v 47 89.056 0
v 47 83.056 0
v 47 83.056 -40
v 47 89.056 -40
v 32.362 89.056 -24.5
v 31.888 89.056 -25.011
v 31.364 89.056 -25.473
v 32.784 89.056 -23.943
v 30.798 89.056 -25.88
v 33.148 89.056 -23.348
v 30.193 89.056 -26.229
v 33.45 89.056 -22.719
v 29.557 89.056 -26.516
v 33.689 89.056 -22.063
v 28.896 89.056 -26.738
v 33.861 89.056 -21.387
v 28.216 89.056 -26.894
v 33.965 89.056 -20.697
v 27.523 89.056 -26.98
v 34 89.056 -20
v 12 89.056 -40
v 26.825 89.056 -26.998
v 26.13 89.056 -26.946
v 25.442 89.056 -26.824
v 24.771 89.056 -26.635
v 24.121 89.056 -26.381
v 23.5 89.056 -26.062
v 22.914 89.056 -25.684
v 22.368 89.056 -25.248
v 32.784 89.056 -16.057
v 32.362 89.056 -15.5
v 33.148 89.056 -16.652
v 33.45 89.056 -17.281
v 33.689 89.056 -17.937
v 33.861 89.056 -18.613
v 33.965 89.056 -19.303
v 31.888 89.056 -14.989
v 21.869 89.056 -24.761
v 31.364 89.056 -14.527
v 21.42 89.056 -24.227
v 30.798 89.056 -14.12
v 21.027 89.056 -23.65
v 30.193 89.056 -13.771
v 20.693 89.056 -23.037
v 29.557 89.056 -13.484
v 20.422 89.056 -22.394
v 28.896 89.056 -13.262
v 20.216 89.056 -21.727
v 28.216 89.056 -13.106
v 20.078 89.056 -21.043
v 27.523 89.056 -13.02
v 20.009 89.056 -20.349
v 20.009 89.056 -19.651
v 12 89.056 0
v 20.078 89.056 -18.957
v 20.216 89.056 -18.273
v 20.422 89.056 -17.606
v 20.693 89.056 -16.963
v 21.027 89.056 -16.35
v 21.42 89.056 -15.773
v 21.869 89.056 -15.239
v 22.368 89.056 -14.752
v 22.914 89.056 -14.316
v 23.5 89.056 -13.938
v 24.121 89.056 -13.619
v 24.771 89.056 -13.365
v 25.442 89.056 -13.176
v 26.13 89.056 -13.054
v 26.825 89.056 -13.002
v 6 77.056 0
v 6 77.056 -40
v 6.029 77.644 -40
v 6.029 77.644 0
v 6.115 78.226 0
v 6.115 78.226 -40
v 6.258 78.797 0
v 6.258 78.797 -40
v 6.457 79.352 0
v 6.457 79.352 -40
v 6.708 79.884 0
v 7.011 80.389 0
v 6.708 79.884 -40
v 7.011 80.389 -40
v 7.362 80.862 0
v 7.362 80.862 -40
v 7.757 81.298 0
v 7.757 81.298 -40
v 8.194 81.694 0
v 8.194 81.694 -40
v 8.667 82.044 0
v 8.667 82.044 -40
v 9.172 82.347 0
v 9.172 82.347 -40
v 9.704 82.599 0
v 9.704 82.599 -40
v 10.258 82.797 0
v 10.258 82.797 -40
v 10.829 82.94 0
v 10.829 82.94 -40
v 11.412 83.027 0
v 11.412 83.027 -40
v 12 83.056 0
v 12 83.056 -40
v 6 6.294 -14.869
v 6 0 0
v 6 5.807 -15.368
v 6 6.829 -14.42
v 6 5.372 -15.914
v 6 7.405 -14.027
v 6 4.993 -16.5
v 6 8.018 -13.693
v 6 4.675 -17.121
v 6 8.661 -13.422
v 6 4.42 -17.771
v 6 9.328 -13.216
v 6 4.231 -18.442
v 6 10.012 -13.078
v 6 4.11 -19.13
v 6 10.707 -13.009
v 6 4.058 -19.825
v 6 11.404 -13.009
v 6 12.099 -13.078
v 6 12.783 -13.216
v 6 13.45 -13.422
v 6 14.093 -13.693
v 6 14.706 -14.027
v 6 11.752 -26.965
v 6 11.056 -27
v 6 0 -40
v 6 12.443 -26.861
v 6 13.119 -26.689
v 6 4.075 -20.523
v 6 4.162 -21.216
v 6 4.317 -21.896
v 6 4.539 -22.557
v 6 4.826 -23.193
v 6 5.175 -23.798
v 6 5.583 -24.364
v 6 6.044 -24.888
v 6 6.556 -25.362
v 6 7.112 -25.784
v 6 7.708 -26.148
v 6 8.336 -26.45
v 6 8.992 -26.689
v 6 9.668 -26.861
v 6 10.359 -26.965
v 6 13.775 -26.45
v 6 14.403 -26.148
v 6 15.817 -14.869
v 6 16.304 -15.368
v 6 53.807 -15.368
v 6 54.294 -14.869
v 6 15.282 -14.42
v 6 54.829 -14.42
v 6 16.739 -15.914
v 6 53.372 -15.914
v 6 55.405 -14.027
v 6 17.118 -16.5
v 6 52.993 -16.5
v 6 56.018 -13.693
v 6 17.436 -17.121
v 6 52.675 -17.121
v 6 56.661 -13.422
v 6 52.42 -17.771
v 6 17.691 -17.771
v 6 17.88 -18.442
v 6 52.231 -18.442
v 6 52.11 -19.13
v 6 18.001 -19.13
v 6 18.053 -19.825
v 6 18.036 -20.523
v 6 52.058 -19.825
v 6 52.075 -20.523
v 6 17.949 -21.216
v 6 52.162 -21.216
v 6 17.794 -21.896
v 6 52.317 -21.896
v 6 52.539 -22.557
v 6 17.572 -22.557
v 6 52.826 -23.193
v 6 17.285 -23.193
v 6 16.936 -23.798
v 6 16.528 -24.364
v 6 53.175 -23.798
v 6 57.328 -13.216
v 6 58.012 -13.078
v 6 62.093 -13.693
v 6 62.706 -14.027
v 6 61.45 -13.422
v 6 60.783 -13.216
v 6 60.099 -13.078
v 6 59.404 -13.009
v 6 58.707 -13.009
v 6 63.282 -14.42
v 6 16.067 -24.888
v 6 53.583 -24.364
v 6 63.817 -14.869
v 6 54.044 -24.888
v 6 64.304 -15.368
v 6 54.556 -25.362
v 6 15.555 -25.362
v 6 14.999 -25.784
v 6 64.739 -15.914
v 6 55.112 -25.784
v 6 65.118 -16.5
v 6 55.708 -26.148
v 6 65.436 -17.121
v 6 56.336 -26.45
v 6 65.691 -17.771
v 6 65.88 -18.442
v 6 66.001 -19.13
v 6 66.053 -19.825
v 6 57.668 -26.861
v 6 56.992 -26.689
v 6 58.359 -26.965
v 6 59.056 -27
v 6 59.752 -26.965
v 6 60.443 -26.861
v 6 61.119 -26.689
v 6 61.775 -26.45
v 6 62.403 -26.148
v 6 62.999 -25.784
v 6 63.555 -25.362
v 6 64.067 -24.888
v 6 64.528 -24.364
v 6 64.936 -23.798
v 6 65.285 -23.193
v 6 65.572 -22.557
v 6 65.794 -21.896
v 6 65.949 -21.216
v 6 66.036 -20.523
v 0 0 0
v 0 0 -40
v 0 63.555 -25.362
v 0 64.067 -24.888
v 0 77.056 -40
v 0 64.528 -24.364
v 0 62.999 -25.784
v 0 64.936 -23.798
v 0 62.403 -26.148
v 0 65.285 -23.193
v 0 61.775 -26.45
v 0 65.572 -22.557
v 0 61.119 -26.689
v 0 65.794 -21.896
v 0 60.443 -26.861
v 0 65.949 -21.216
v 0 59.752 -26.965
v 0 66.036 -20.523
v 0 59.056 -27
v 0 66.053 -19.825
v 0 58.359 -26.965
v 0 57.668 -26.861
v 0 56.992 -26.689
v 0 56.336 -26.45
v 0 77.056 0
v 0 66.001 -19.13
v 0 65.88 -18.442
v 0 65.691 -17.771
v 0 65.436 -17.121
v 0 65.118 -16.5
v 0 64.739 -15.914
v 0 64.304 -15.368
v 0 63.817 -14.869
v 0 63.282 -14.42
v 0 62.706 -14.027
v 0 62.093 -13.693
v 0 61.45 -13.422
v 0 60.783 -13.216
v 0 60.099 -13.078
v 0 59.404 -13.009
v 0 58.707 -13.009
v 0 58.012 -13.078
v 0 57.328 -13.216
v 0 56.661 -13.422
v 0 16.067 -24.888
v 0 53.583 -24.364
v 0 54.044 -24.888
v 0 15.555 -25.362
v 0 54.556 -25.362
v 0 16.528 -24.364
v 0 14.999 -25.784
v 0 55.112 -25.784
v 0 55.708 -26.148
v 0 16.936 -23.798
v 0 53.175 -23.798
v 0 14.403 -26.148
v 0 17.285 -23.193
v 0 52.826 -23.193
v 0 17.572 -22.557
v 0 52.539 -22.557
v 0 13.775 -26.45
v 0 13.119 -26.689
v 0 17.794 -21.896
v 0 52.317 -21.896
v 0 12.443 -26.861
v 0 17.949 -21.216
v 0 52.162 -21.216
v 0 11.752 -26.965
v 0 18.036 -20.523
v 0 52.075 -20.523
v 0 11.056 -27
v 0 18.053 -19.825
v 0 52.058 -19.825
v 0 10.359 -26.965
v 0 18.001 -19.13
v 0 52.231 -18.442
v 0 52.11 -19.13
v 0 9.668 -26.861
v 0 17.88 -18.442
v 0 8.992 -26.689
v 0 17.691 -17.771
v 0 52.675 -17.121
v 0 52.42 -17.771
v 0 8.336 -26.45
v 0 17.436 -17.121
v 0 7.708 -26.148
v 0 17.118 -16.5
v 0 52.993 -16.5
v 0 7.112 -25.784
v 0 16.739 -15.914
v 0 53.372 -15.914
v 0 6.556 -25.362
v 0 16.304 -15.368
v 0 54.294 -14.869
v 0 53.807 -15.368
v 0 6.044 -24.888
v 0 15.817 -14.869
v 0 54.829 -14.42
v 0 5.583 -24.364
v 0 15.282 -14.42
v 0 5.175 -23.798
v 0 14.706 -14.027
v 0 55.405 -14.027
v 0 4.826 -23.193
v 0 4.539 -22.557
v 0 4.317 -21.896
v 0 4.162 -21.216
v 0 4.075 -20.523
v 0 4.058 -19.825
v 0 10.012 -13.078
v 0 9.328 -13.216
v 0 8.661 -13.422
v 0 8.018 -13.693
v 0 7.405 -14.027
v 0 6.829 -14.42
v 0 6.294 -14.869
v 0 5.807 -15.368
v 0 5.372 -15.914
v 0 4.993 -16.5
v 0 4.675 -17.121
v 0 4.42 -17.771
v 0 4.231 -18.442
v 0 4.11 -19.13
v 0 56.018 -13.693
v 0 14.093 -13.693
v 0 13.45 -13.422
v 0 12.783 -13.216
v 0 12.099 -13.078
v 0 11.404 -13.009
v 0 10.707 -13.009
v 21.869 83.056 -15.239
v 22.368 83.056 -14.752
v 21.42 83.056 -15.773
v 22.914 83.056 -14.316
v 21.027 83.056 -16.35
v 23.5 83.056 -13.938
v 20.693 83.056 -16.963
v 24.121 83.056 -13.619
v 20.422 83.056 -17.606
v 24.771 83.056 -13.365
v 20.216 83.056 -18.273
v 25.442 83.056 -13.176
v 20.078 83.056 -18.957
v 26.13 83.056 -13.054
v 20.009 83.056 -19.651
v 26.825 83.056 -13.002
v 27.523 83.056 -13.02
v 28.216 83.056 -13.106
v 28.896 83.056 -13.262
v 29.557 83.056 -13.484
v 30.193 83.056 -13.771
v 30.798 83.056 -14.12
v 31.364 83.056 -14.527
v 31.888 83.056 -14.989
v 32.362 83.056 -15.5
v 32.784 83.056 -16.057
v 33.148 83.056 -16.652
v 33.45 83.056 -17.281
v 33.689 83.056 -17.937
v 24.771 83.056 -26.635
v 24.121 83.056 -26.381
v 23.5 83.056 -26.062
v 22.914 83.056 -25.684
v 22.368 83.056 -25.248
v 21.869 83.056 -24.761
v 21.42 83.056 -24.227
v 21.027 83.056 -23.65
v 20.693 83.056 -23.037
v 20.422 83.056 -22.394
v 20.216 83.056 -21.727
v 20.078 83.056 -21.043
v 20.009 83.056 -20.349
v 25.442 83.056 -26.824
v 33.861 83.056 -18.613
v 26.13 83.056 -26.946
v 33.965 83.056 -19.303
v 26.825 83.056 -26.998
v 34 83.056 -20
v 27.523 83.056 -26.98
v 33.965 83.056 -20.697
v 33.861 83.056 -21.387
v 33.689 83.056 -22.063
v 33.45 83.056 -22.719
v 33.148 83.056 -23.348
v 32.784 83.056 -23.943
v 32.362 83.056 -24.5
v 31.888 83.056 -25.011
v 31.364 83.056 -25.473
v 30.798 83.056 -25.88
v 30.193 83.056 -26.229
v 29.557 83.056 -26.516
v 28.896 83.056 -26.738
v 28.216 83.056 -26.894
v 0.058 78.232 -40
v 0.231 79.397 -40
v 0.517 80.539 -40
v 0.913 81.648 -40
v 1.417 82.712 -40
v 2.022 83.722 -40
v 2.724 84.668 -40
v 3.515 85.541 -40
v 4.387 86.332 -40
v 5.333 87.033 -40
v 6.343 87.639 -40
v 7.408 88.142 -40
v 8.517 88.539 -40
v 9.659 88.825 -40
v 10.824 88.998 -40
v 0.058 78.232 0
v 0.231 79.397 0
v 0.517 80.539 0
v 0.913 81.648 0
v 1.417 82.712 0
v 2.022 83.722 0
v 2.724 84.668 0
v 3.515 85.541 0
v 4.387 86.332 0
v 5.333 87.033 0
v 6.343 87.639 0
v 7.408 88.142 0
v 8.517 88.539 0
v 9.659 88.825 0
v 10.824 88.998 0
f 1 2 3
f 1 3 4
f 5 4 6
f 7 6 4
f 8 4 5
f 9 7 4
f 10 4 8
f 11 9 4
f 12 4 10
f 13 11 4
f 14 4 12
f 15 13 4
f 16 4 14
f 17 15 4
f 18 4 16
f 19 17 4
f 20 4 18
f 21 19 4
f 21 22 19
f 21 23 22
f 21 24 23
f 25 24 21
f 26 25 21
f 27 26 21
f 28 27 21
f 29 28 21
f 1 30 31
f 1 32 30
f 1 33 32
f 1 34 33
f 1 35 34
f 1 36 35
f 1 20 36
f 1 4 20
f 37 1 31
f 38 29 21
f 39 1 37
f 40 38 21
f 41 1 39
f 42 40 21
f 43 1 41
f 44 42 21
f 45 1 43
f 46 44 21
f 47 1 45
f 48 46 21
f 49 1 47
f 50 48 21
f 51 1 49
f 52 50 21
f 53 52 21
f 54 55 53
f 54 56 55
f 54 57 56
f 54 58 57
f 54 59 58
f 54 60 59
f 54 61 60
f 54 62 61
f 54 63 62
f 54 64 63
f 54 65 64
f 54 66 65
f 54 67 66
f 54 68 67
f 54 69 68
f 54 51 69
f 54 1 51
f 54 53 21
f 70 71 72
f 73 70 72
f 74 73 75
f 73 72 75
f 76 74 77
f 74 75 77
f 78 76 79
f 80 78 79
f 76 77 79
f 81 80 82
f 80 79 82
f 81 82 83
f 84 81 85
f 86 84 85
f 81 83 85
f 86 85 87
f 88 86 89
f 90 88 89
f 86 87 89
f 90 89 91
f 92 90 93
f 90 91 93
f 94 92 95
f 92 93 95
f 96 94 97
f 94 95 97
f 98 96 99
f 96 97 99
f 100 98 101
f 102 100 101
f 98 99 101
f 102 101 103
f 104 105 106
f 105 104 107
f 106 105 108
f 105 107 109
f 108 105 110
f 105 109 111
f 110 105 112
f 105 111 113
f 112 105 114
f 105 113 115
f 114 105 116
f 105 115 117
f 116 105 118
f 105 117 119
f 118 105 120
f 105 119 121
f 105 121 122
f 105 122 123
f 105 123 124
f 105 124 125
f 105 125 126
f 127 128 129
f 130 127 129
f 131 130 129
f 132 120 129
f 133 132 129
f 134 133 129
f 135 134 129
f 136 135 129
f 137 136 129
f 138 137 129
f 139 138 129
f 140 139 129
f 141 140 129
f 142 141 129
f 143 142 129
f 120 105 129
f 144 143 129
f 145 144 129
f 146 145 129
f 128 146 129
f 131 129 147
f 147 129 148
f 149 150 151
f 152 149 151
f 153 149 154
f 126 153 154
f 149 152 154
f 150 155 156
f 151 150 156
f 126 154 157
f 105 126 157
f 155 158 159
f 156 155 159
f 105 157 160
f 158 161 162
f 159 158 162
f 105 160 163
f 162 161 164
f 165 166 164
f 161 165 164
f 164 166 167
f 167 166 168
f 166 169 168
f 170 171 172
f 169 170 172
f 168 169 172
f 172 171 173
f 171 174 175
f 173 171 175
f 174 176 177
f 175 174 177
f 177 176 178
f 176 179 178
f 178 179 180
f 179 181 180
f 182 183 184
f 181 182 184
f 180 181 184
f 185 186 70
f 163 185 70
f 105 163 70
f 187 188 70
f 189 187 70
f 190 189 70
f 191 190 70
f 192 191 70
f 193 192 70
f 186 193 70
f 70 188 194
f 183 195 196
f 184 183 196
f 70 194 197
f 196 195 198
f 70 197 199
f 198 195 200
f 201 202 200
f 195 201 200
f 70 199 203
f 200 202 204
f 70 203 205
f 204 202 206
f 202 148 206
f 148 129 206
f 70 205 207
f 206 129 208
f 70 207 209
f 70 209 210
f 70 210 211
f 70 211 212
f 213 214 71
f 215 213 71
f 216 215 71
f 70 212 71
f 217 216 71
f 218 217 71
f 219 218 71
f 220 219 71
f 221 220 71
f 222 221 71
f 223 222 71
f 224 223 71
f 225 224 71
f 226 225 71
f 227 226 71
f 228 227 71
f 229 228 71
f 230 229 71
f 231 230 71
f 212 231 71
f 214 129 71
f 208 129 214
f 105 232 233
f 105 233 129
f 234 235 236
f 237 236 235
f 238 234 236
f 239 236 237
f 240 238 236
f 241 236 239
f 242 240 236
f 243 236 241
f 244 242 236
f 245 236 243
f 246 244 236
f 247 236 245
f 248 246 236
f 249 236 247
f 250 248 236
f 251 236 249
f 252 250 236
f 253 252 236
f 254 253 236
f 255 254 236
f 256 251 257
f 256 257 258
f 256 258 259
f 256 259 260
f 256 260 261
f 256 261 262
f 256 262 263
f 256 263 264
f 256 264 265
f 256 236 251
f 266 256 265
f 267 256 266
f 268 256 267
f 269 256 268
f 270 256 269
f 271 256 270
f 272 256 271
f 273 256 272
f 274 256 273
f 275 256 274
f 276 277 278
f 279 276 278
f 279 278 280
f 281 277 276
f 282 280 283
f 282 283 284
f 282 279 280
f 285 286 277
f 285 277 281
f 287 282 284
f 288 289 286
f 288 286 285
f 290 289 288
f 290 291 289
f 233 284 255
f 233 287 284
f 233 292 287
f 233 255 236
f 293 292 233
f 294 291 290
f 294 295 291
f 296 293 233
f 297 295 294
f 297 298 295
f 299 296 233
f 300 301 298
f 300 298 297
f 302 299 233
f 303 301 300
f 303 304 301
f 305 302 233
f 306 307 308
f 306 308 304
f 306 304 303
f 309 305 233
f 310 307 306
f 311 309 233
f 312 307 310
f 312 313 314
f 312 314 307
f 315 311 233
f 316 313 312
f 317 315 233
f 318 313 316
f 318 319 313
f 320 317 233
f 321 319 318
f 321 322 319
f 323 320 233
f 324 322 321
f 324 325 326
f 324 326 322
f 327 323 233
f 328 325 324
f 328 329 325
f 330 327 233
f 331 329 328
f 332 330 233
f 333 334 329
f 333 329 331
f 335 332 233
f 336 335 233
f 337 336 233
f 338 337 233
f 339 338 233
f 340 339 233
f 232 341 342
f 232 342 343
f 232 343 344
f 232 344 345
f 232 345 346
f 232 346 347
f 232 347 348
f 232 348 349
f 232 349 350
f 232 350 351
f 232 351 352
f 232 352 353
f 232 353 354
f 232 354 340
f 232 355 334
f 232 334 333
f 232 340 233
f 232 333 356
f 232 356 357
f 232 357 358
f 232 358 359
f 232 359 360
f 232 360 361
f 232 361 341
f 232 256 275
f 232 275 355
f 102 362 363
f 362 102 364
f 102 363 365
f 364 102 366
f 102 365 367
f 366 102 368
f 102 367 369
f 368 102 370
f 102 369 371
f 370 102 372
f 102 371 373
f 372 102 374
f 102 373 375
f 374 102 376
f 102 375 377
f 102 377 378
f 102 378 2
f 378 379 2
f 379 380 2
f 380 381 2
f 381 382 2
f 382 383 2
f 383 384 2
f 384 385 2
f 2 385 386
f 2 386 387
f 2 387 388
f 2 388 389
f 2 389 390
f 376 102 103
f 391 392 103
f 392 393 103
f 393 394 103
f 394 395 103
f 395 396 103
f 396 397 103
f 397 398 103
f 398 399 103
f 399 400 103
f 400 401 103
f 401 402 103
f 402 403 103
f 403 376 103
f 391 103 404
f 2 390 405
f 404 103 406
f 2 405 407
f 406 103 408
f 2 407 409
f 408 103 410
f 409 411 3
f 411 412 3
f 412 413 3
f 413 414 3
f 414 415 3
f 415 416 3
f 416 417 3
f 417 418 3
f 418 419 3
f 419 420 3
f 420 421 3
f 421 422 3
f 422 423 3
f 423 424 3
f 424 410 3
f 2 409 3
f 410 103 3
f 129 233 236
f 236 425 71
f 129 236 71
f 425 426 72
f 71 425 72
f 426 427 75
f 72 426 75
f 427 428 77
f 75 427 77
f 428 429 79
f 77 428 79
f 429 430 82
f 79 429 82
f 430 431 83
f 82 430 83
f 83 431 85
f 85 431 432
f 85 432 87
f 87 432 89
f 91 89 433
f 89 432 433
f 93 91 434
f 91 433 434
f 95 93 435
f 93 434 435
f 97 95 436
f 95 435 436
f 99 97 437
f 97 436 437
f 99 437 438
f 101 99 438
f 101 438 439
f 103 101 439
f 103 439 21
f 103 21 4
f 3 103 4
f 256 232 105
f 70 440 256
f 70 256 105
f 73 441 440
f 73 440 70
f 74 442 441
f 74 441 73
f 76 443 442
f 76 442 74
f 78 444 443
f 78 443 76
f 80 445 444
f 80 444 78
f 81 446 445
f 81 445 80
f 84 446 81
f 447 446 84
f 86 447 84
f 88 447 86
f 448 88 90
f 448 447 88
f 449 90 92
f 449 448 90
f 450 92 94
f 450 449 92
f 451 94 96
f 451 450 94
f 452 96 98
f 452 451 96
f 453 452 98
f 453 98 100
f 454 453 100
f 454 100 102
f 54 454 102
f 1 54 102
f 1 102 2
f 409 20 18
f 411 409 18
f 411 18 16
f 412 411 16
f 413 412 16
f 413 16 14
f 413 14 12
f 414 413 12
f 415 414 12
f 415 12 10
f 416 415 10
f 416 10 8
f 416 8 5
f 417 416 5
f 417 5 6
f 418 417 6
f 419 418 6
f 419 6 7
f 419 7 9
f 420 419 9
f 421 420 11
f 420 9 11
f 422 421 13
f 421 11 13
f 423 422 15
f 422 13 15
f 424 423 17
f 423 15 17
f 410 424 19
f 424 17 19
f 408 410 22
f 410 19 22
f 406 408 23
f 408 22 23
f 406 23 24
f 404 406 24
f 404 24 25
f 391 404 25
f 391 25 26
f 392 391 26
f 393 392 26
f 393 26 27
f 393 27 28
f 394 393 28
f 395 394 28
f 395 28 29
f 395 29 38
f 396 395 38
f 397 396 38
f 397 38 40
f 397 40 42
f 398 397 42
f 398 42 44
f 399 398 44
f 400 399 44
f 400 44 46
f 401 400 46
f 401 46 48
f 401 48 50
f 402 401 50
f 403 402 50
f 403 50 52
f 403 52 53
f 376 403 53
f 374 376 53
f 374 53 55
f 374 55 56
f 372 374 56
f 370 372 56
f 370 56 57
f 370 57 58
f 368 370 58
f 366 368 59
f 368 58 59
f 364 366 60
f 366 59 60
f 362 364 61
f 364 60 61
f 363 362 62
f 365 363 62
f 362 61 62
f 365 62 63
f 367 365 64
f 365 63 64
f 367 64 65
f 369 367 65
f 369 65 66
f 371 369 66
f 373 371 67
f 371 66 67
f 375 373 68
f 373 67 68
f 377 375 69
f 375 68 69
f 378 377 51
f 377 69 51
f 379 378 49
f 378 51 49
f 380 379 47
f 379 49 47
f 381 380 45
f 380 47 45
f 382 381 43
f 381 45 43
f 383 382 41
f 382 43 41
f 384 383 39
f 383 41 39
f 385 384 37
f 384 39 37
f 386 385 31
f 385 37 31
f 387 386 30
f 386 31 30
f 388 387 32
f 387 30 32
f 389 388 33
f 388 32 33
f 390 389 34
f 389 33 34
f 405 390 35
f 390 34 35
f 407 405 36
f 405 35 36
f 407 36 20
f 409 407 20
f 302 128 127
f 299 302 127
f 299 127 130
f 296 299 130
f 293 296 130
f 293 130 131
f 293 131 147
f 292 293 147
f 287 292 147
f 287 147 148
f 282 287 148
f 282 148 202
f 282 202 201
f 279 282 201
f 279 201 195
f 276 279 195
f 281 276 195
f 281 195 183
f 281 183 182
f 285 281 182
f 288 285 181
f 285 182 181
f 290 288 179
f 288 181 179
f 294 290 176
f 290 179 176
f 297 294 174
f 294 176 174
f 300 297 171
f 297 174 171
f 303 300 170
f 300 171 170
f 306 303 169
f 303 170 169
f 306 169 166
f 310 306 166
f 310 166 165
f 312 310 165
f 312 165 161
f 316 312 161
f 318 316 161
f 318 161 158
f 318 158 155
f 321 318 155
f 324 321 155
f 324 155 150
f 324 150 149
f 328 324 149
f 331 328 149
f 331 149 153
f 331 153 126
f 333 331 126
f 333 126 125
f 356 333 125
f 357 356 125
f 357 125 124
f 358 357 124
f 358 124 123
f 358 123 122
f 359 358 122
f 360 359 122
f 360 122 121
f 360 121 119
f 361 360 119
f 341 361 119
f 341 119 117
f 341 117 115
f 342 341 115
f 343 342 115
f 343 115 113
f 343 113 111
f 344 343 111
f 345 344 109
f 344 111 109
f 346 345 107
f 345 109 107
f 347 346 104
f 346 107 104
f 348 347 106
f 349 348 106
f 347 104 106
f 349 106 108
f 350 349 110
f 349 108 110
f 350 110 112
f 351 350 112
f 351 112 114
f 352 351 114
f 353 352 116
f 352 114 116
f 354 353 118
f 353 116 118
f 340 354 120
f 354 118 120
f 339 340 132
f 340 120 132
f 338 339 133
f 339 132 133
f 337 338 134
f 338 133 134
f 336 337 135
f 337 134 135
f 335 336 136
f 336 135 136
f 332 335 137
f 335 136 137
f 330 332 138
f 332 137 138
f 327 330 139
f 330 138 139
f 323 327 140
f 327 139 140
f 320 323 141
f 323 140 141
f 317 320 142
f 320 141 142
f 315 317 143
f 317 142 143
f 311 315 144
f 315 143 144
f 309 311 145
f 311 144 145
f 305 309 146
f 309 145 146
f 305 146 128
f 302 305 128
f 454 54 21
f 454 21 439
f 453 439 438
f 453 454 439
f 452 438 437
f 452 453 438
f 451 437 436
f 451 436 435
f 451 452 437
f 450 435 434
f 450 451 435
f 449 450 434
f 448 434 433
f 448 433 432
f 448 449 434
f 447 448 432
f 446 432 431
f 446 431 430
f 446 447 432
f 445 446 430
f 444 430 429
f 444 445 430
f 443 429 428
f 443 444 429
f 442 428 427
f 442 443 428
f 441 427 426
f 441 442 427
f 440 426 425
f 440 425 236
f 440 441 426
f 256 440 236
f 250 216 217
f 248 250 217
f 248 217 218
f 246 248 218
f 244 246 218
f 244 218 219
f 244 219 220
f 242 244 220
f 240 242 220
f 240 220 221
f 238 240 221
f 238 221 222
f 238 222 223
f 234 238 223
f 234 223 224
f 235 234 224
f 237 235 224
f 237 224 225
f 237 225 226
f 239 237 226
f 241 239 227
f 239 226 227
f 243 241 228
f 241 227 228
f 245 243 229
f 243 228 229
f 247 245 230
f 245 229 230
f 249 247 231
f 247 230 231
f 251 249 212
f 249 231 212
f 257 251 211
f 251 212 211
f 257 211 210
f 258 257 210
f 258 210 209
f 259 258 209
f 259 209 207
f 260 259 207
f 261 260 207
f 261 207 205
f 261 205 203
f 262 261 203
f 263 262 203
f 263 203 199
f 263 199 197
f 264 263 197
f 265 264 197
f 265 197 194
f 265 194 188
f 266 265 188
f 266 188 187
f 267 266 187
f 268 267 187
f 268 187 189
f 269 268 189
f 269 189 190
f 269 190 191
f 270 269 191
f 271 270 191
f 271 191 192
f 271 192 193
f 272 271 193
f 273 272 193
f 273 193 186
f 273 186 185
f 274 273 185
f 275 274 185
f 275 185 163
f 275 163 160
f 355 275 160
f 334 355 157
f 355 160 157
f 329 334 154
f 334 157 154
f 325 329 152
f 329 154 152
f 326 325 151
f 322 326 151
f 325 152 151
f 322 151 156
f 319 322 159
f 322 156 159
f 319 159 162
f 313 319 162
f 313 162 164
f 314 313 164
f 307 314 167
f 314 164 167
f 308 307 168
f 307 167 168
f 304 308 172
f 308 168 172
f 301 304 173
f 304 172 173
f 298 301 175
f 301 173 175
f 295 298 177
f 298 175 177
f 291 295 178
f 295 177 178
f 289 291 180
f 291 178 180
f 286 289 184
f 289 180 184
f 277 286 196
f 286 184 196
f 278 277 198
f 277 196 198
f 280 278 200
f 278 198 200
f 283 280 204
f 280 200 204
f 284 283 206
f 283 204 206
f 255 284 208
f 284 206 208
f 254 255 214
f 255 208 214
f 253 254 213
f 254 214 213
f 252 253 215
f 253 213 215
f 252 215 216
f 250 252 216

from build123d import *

# Parameters (mm, degrees)
BASE_FLANGE1_DEPTH             = 40
CUT_EXTRUDE1_DEPTH             = 109.350745652
F_14_0_14_DIAMETER_HOLE1_D     = 14
F_14_0_14_DIAMETER_HOLE1_DEPTH = 47
F_14_0_14_DIAMETER_HOLE2_D     = 14


# Sheet-metal steps are written as plain solids
with BuildPart() as part:
    # Sketch7 → Base-Flange1 (new body)
    with BuildSketch(Plane.XY):
        with BuildLine():
            Line((0, 0), (47, 0))
            Line((47, 0), (47, 89.055511246))
            Line((47, 89.055511246), (12, 89.055511246))
            ThreePointArc((12, 89.055511246), (3.514718626, 85.54079262), (0, 77.055511246))
            Line((0, 77.055511246), (0, 0))
        make_face()
    extrude(amount=-BASE_FLANGE1_DEPTH)

    # Sketch10 → Cut-Extrude1 (cut, through all)
    with BuildSketch(Plane(origin=(0, 0, -40), x_dir=(-1, 0, 0), z_dir=(0, 0, -1))):
        with BuildLine():
            Line((-12, 83.055511246), (-47, 83.055511246))
            Line((-47, 83.055511246), (-47, 0))
            Line((-47, 0), (-6, 0))
            Line((-6, 0), (-6, 77.055511246))
            ThreePointArc((-6, 77.055511246), (-7.757359313, 81.298151933), (-12, 83.055511246))
        make_face()
    extrude(amount=-CUT_EXTRUDE1_DEPTH, mode=Mode.SUBTRACT)

    # Ø14.0 (14) Diameter Hole1
    with Locations(Plane.ZY):
        with Locations((-20, 59.055511246), (-20, 11.055511246)):
            Hole(F_14_0_14_DIAMETER_HOLE1_D / 2, depth=F_14_0_14_DIAMETER_HOLE1_DEPTH)

    # Ø14.0 (14) Diameter Hole2 (through all)
    with Locations(Plane(origin=(0, 83.055511246, 0), x_dir=(-1, 0, 0), z_dir=(0, -1, 0))):
        with Locations((-27, 20)):
            Hole(F_14_0_14_DIAMETER_HOLE2_D / 2)


solid = part.part
